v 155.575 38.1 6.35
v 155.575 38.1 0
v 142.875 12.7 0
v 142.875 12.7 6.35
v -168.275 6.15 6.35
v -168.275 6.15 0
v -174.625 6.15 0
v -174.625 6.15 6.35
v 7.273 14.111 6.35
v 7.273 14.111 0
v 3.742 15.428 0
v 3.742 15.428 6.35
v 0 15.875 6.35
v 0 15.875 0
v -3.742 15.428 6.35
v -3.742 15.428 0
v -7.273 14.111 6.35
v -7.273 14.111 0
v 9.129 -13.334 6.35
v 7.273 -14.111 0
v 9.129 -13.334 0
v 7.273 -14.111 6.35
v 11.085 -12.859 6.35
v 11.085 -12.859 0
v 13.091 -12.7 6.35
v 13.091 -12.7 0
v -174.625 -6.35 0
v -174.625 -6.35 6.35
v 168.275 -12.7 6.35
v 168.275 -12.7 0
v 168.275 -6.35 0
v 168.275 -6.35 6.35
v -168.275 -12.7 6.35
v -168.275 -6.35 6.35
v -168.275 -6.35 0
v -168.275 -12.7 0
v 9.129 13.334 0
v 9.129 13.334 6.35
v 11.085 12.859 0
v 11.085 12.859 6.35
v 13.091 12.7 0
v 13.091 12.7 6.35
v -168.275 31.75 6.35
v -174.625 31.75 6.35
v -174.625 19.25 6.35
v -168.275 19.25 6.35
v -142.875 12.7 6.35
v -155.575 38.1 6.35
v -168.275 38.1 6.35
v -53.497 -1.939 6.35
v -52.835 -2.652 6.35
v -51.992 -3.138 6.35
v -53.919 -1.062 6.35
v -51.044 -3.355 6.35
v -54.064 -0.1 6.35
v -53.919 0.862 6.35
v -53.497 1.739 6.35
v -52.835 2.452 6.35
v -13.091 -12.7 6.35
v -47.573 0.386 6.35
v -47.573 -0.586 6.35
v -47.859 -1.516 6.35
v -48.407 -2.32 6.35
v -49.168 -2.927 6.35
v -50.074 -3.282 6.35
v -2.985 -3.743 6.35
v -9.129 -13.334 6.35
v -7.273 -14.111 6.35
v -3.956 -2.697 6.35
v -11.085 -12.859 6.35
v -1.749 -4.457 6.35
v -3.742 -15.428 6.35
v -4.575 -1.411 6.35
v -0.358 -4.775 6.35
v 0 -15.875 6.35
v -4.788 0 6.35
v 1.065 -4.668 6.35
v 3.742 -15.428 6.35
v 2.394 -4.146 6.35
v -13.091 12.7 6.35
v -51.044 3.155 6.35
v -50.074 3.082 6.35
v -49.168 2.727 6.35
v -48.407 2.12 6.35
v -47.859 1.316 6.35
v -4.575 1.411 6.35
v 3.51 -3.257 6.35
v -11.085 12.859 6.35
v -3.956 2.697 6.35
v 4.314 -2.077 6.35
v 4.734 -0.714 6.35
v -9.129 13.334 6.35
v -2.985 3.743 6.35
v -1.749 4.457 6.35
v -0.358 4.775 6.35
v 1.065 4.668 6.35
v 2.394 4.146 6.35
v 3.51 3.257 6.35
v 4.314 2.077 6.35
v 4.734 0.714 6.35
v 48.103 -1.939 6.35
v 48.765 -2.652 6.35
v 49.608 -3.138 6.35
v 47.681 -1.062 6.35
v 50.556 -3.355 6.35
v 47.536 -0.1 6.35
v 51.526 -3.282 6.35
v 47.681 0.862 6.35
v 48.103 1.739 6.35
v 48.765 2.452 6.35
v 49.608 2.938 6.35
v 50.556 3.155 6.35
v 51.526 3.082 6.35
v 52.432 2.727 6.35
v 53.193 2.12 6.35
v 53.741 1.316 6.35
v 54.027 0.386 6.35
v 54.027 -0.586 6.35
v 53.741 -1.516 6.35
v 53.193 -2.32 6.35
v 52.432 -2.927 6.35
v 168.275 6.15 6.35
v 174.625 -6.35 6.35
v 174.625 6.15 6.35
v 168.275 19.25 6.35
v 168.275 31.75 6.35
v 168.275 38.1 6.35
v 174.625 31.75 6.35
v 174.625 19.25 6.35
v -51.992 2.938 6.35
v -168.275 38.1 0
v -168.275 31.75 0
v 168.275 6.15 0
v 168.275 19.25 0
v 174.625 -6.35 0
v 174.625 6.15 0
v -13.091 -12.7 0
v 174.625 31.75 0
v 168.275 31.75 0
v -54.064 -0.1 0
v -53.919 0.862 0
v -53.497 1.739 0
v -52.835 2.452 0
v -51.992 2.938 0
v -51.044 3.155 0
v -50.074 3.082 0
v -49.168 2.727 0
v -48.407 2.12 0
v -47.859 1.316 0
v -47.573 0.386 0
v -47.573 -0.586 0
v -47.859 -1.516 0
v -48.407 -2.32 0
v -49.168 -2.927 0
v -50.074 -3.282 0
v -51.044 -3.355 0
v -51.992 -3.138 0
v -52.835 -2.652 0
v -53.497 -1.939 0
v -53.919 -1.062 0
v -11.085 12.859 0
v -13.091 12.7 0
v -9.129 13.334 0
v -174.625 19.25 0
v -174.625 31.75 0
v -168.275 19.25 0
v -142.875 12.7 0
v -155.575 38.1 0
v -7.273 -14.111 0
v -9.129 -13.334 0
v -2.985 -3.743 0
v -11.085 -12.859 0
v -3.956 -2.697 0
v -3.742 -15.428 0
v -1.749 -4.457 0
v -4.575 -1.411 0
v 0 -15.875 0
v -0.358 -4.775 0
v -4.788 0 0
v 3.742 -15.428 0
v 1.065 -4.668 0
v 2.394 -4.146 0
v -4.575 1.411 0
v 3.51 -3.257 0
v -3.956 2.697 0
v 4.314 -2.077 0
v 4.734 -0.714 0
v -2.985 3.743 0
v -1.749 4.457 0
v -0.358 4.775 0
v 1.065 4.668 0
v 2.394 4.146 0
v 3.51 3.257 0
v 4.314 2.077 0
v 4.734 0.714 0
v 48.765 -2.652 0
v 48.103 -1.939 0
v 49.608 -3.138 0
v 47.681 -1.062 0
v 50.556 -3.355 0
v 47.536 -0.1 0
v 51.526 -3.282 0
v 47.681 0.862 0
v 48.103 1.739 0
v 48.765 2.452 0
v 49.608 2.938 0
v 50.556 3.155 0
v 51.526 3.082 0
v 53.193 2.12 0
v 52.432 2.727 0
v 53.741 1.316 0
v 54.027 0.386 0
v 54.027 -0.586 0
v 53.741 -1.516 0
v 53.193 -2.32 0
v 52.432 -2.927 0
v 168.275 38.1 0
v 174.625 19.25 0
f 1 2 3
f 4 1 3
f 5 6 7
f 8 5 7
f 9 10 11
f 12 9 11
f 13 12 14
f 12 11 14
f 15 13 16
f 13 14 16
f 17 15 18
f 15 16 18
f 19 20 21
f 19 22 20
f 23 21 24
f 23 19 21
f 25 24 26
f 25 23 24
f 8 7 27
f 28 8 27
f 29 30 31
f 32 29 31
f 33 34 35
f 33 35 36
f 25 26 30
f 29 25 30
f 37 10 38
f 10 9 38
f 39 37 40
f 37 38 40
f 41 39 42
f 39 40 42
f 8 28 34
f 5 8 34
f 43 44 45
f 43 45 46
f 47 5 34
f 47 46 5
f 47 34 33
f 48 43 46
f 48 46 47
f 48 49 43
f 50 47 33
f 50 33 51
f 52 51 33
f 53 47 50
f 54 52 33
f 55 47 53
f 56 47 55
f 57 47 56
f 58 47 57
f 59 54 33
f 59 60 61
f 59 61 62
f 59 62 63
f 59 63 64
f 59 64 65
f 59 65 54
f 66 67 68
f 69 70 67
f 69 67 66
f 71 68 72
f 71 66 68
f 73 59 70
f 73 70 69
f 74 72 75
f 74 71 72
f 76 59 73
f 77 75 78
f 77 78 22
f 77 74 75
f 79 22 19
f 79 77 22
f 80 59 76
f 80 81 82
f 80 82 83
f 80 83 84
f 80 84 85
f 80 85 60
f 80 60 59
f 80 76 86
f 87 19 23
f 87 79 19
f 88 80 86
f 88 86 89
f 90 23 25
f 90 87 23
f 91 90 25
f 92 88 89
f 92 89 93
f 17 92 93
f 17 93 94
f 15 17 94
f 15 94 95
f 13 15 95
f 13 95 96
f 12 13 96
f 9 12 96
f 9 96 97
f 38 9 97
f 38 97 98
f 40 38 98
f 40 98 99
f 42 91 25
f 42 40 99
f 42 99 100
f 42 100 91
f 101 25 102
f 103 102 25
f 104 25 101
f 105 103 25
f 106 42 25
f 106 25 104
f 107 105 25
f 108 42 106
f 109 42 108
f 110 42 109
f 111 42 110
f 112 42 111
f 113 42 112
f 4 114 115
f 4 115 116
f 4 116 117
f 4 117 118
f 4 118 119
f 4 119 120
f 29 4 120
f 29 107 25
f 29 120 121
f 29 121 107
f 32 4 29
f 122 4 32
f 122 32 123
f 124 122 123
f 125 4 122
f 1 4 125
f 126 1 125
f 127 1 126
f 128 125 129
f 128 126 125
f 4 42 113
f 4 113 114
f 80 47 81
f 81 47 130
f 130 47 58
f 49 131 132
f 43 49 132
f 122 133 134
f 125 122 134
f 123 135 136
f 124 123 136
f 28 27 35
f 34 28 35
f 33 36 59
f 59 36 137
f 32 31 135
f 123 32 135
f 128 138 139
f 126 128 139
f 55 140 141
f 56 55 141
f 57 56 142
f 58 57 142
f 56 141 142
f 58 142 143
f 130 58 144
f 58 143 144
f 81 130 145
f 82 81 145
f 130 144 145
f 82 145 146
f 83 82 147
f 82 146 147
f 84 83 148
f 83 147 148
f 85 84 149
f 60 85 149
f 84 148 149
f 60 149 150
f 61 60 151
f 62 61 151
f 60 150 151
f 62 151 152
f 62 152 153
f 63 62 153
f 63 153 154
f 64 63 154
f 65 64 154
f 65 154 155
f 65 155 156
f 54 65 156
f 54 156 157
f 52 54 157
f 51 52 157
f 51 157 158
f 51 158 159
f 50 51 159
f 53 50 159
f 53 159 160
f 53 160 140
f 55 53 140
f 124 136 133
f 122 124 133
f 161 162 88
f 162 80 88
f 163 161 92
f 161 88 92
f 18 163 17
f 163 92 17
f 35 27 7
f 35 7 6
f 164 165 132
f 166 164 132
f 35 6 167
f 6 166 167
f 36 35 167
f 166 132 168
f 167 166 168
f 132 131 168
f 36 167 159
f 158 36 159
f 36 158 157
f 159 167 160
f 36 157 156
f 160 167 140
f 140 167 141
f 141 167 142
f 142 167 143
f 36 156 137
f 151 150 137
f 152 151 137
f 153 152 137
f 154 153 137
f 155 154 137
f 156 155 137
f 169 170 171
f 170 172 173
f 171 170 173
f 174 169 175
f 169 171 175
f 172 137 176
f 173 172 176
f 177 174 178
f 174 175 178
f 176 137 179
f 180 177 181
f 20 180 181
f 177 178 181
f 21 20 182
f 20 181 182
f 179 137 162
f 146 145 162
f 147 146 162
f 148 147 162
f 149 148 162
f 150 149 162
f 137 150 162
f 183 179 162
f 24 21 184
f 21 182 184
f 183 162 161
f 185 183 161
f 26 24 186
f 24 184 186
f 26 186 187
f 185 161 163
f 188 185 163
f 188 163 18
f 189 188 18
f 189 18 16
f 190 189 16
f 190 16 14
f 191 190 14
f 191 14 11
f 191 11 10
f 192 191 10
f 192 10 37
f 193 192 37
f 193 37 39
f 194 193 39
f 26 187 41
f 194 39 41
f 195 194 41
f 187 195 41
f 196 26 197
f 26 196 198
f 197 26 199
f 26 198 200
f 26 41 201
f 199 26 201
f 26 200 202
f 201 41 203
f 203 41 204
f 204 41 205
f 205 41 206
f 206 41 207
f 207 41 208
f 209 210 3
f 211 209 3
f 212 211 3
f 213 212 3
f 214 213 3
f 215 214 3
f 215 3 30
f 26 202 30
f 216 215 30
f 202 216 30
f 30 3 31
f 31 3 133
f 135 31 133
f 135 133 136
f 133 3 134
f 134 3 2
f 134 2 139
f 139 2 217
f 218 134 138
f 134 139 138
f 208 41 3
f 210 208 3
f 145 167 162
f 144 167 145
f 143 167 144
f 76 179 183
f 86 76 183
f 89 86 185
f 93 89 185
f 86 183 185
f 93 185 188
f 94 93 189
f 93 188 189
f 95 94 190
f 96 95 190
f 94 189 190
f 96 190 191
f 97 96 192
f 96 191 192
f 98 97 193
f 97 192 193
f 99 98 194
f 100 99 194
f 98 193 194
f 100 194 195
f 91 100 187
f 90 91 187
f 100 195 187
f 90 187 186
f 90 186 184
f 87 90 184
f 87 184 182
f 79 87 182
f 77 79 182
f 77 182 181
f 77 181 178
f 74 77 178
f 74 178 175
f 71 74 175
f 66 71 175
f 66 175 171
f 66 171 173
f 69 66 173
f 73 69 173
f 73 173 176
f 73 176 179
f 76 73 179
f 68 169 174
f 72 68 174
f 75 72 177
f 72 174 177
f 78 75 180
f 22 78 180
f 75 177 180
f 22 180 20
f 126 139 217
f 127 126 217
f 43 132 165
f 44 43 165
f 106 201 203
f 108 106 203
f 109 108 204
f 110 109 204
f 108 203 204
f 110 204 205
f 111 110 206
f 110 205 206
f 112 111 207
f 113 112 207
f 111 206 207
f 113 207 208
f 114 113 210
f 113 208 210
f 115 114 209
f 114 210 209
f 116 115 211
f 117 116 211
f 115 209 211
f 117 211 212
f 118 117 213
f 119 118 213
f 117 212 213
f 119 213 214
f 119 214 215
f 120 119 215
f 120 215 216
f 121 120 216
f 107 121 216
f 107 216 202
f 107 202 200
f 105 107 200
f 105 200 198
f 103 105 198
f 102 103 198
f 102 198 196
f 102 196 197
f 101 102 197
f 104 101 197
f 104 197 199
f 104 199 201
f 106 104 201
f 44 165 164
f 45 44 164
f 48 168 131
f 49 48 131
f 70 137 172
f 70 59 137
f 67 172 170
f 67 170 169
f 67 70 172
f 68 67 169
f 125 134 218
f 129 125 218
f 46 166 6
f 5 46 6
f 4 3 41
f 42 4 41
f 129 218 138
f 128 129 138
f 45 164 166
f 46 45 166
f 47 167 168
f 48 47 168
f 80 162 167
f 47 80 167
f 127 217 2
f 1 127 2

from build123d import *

# Parameters (mm, degrees)
BOSS_EXTRUDE1_DEPTH      = 6.35
V_0_377_DIAMETER_HOLE1_D = 9.5758
FILLET2_R                = 12.7
F_0_257_DIAMETER_HOLE1_D = 6.5278


with BuildPart() as part:
    # Sketch1 → Boss-Extrude1 (new body)
    with BuildSketch(Plane.XY):
        with BuildLine():
            Line((-168.275, -6.35), (-168.275, -12.7))
            Line((-168.275, -12.7), (-142.875, -12.7))
            Line((-142.875, -12.7), (-9.525, -12.7))
            ThreePointArc((-9.525, -12.7), (0, -15.875), (9.525, -12.7))
            Line((9.525, -12.7), (142.875, -12.7))
            Line((142.875, -12.7), (168.275, -12.7))
            Line((168.275, -12.7), (168.275, -6.35))
            Line((168.275, -6.35), (174.625, -6.35))
            Line((174.625, -6.35), (174.625, 6.15))
            Line((174.625, 6.15), (168.275, 6.15))
            Line((168.275, 6.15), (168.275, 12.7))
            Line((168.275, 12.7), (168.275, 19.25))
            Line((168.275, 19.25), (174.625, 19.25))
            Line((174.625, 19.25), (174.625, 31.75))
            Line((174.625, 31.75), (168.275, 31.75))
            Line((168.275, 31.75), (168.275, 38.1))
            Line((168.275, 38.1), (155.575, 38.1))
            Line((155.575, 38.1), (142.875, 12.7))
            Line((142.875, 12.7), (9.525, 12.7))
            ThreePointArc((9.525, 12.7), (0, 15.875), (-9.525, 12.7))
            Line((-9.525, 12.7), (-142.875, 12.7))
            Line((-142.875, 12.7), (-155.575, 38.1))
            Line((-155.575, 38.1), (-168.275, 38.1))
            Line((-168.275, 38.1), (-168.275, 31.75))
            Line((-168.275, 31.75), (-174.625, 31.75))
            Line((-174.625, 31.75), (-174.625, 19.25))
            Line((-174.625, 19.25), (-168.275, 19.25))
            Line((-168.275, 19.25), (-168.275, 12.7))
            Line((-168.275, 12.7), (-168.275, 6.15))
            Line((-168.275, 6.15), (-174.625, 6.15))
            Line((-174.625, 6.15), (-174.625, -6.35))
            Line((-174.625, -6.35), (-168.275, -6.35))
        make_face()
    extrude(amount=BOSS_EXTRUDE1_DEPTH)

    # V (0.377) Diameter Hole1 (through all)
    with Locations(Plane.XY.offset(6.35)):
        with Locations((0, 0)):
            Hole(V_0_377_DIAMETER_HOLE1_D / 2)

    # Fillet2
    fillet2_edges = [part.edges().sort_by_distance(p)[0] for p in [
        (-9.525, 12.7, 3.175),
        (9.525, 12.7, 3.175),
        (9.525, -12.7, 3.175),
        (-9.525, -12.7, 3.175),
    ]]
    fillet(fillet2_edges, radius=FILLET2_R)

    # F (0.257) Diameter Hole1 (through all)
    with Locations(Plane.XY.offset(6.35)):
        with Locations((-50.8, -0.1), (50.8, -0.1)):
            Hole(F_0_257_DIAMETER_HOLE1_D / 2)


solid = part.part
